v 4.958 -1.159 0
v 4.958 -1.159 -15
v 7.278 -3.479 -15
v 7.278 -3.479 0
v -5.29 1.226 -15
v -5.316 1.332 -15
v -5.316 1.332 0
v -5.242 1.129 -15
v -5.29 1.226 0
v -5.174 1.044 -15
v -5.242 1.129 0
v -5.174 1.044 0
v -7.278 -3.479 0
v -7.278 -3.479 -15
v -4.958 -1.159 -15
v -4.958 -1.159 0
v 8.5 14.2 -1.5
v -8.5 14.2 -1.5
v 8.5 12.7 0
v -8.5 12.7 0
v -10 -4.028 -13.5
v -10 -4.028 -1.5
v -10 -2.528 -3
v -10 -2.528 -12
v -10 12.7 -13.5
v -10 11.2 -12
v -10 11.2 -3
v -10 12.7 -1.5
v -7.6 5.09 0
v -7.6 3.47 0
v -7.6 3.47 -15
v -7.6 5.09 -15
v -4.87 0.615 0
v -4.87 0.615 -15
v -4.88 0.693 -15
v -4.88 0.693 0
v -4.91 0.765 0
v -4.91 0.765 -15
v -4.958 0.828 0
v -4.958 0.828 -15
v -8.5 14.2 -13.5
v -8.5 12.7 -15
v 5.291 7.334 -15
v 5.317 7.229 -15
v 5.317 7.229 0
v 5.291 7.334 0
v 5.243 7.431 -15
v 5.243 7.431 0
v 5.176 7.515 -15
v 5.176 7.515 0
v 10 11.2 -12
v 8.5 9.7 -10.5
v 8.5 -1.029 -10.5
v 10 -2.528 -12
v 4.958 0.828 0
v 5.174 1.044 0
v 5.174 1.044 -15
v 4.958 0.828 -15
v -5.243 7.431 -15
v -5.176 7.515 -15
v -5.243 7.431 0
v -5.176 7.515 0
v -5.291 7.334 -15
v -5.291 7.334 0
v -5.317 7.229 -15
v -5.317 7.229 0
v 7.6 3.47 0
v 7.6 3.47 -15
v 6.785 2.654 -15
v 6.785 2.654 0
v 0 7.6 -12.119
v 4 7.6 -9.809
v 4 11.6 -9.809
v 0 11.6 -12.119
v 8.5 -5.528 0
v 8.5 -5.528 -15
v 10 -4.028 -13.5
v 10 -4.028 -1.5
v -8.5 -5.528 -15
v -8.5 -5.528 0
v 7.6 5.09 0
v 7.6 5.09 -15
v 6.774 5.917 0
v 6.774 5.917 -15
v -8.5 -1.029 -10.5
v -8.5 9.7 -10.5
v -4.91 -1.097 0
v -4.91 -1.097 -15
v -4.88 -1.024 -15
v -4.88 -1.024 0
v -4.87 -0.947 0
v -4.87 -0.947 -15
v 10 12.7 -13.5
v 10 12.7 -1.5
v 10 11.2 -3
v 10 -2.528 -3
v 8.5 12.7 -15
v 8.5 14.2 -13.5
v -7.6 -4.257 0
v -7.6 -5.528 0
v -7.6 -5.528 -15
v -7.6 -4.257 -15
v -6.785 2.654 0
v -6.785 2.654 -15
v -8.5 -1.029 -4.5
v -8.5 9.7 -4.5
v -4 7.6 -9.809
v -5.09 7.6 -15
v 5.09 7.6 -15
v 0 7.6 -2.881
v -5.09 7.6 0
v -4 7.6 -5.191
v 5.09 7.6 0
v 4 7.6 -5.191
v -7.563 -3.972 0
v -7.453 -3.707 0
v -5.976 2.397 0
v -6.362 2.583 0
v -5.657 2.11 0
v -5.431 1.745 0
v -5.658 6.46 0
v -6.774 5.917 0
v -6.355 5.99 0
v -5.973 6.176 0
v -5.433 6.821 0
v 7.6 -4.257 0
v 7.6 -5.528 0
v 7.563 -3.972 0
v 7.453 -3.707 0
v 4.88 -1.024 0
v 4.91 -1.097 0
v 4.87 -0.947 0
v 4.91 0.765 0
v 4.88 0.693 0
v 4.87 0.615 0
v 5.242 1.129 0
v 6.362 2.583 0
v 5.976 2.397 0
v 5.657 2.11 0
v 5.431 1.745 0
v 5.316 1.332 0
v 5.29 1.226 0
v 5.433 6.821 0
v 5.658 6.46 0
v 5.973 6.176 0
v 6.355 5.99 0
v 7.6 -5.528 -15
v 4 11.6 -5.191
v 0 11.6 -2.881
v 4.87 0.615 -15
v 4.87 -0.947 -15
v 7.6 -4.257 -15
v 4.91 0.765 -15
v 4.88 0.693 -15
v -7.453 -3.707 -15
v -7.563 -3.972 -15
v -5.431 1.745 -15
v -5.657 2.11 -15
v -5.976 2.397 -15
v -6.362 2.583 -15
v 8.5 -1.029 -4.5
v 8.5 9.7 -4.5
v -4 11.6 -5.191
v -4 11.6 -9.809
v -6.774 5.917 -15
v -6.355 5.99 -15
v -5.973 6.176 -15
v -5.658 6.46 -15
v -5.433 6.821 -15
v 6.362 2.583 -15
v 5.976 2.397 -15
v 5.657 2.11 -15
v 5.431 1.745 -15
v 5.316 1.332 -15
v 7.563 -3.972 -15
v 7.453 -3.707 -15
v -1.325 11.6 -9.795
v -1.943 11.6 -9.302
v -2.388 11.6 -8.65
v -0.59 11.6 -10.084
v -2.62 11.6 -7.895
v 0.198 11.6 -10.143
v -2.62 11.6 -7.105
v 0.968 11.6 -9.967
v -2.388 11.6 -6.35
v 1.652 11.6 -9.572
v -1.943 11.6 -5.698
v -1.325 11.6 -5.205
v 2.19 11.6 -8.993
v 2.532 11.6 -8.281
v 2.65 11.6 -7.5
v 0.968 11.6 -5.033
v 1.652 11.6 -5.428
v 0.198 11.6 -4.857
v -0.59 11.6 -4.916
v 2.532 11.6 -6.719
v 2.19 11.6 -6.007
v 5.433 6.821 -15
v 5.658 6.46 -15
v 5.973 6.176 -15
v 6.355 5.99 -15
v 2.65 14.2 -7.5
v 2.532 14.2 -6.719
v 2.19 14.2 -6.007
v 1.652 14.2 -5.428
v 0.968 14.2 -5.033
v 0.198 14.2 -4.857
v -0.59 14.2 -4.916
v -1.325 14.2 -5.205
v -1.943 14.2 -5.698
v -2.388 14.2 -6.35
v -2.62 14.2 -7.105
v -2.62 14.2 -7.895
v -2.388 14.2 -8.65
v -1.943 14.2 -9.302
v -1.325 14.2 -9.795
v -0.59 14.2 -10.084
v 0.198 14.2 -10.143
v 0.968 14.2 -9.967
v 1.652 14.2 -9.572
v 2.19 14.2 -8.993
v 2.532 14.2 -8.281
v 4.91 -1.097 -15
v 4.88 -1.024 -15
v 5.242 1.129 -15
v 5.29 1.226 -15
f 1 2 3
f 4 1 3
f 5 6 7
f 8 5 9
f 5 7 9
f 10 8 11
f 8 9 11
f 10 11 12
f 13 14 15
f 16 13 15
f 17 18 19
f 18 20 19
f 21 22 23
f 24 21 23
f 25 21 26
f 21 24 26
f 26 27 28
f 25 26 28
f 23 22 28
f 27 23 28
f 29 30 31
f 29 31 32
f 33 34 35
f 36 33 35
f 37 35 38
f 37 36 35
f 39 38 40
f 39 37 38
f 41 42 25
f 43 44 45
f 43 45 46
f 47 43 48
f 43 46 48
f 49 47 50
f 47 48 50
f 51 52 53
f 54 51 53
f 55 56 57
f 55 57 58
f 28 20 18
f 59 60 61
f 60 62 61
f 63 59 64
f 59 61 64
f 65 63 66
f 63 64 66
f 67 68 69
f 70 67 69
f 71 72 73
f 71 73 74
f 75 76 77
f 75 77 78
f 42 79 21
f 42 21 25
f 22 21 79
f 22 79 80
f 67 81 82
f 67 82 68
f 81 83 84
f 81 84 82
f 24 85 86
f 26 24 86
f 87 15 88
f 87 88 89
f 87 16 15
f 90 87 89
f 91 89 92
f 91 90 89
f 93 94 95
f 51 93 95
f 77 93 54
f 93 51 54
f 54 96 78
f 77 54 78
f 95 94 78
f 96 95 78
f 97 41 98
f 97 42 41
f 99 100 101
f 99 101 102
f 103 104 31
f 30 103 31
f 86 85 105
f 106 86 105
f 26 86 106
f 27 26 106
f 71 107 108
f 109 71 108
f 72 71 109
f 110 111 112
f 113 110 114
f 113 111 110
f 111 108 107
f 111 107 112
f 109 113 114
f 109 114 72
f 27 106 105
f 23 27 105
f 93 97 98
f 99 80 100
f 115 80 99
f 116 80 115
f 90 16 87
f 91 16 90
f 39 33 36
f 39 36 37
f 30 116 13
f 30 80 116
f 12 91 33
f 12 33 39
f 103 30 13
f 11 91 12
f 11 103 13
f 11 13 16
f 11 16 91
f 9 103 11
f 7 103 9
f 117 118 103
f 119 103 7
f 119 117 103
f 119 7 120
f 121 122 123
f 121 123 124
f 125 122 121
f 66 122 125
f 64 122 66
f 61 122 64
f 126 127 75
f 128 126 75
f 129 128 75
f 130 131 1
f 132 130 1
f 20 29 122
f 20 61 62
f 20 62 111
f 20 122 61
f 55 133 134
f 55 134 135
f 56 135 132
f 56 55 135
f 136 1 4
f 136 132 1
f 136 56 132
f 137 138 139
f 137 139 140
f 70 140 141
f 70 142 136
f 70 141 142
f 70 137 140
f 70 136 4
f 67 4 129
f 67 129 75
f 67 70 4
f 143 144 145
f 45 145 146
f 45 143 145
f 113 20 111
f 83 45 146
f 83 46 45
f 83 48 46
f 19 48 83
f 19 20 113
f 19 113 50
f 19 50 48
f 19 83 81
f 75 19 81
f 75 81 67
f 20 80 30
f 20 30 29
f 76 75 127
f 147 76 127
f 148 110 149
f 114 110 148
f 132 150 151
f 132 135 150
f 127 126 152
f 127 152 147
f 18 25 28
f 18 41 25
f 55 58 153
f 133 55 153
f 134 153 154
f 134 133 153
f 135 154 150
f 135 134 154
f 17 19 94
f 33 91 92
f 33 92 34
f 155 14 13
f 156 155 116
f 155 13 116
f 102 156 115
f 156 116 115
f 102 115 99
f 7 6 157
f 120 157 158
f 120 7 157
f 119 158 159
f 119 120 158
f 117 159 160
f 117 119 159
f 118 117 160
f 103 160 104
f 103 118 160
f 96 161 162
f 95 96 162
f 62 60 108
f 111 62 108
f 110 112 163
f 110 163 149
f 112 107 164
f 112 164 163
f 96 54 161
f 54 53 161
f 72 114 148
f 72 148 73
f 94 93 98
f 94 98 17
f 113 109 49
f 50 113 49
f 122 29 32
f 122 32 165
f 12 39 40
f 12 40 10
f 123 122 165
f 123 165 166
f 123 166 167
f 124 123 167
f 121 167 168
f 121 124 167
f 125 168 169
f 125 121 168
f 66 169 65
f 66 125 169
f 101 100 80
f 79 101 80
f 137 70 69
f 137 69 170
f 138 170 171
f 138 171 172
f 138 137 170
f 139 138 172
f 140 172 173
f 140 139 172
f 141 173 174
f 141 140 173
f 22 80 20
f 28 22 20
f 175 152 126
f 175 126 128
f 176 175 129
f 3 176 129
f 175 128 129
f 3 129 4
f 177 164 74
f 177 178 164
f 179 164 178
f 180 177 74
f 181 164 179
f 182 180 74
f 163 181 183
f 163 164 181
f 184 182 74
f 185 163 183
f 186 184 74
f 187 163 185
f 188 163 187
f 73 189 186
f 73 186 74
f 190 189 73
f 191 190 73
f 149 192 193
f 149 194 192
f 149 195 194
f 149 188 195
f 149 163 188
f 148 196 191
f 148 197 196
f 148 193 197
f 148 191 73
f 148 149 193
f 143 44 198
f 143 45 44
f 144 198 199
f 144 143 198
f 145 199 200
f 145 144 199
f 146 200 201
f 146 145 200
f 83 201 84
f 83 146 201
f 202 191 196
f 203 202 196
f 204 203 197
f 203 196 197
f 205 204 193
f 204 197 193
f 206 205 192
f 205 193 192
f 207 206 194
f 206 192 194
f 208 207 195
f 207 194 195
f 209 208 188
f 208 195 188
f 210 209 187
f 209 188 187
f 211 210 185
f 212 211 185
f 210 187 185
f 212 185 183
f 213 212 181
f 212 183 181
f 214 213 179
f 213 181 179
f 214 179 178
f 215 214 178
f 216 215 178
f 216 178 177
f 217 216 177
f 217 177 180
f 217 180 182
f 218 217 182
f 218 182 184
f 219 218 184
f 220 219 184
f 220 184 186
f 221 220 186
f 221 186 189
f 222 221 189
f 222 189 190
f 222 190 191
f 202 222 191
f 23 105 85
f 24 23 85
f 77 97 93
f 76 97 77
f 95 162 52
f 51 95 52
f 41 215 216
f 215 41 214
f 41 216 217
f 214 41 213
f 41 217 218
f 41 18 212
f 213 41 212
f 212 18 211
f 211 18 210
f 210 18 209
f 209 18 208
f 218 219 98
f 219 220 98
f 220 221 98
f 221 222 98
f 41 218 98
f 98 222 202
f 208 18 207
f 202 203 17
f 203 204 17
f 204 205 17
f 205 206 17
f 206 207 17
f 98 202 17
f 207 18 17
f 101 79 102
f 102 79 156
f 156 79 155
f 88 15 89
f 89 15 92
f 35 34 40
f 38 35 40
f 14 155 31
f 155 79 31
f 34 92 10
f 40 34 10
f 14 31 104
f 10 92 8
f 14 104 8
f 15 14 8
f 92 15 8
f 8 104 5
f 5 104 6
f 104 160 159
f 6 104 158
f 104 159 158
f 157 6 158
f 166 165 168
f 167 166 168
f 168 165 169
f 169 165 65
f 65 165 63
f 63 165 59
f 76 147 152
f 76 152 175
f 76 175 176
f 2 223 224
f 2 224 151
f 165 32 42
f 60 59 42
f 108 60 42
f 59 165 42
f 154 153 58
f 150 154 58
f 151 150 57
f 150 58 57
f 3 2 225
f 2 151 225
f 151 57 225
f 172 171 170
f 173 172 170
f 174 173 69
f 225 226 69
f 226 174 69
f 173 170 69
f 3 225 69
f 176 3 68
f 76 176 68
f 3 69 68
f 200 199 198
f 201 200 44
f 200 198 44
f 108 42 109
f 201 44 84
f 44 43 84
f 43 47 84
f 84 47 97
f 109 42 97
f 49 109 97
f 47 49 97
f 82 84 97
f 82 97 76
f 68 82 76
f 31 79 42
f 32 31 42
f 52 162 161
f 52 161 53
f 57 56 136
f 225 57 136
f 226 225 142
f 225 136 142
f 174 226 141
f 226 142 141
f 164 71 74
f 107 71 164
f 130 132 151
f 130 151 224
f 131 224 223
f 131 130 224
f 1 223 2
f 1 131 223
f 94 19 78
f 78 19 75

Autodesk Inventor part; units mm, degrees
ref_plane "YZ Plane" through (0, 0, 0) normal (1, 0, 0) x (0, 1, 0)
ref_plane "XZ Plane" through (0, 0, 0) normal (0, 1, 0) x (-1, 0, 0)
ref_plane "XY Plane" through (0, 0, 0) normal (0, 0, 1) x (1, 0, 0)
sketch "Sketch1" plane through (0, 0, 0) normal (0, 0, 1) x (1, 0, 0)
  arc A0 (-5.217, 1.3451) -> (-5.1032, 1.1142) centre (-4.8204, 1.397) ccw projected
  line L0 (-5.1032, 1.1142) -> (-4.8872, 0.8982) projected
  arc A1 (-4.77, 0.6153) -> (-4.8872, 0.8982) centre (-5.17, 0.6153) ccw projected
  line L1 (-4.77, 0.6153) -> (-4.77, -0.9467) projected
  arc A2 (-4.8872, -1.2296) -> (-4.77, -0.9467) centre (-5.17, -0.9467) ccw projected
  line L2 (-4.8872, -1.2296) -> (-7.2071, -3.5495) projected
  arc A3 (-7.2071, -3.5495) -> (-7.5, -4.2566) centre (-6.5, -4.2566) ccw projected
  line L3 (-7.5, -4.2566) -> (-7.5, -6.8) projected
  line L4 (-7.5, -6.8) -> (-6.8, -7.5) projected
  line L5 (-6.8, -7.5) -> (6.8, -7.5) projected
  line L6 (6.8, -7.5) -> (7.5, -6.8) projected
  line L7 (7.5, -6.8) -> (7.5, -4.2566) projected
  arc A4 (7.5, -4.2566) -> (7.2071, -3.5495) centre (6.5, -4.2566) ccw projected
  line L8 (7.2071, -3.5495) -> (4.8872, -1.2296) projected
  arc A5 (4.77, -0.9467) -> (4.8872, -1.2296) centre (5.17, -0.9467) ccw projected
  line L9 (4.77, -0.9467) -> (4.77, 0.6153) projected
  arc A6 (4.8872, 0.8982) -> (4.77, 0.6153) centre (5.17, 0.6153) ccw projected
  line L10 (4.8872, 0.8982) -> (5.1032, 1.1142) projected
  arc A7 (5.1032, 1.1142) -> (5.217, 1.3451) centre (4.8204, 1.397) ccw projected
  arc A8 (6.7419, 2.7529) -> (5.217, 1.3451) centre (6.8233, 1.1349) ccw projected
  line L11 (6.7419, 2.7529) -> (7.5, 3.511) projected
  line L12 (7.5, 3.511) -> (7.5, 5.049) projected
  line L13 (7.5, 5.049) -> (6.7304, 5.8186) projected
  arc A9 (5.2183, 7.2157) -> (6.7304, 5.8186) centre (6.8233, 7.436) ccw projected
  arc A10 (5.2183, 7.2157) -> (5.1049, 7.4441) centre (4.822, 7.1613) ccw projected
  line L14 (5.1049, 7.4441) -> (5.049, 7.5) projected
  line L15 (5.049, 7.5) -> (-5.049, 7.5) projected
  line L16 (-5.049, 7.5) -> (-5.1049, 7.4441) projected
  arc A11 (-5.1049, 7.4441) -> (-5.2183, 7.2157) centre (-4.822, 7.1613) ccw projected
  arc A12 (-6.7304, 5.8186) -> (-5.2183, 7.2157) centre (-6.8233, 7.436) ccw projected
  line L17 (-6.7304, 5.8186) -> (-7.5, 5.049) projected
  line L18 (-7.5, 5.049) -> (-7.5, 3.511) projected
  line L19 (-7.5, 3.511) -> (-6.7419, 2.7529) projected
  arc A13 (-5.217, 1.3451) -> (-6.7419, 2.7529) centre (-6.8233, 1.1349) ccw projected
  line L20 (-7.5, -5.5283) -> (-10, -5.5283)
  line L21 (-10, -5.5283) -> (-10, 14.2)
  line L22 (-10, 14.2) -> (10, 14.2)
  line L23 (10, 14.2) -> (10, -5.5283)
  line L24 (10, -5.5283) -> (7.5, -5.5283)
  arc A14 (-7.2778, -3.4788) -> (-7.6, -4.2566) centre (-6.5, -4.2566) ccw
  line L25 (-7.2778, -3.4788) -> (-4.9579, -1.1589)
  arc A15 (-4.9579, -1.1589) -> (-4.87, -0.9467) centre (-5.17, -0.9467) ccw
  line L26 (-4.87, -0.9467) -> (-4.87, 0.6153)
  arc A16 (-4.87, 0.6153) -> (-4.9579, 0.8275) centre (-5.17, 0.6153) ccw
  line L27 (-4.9579, 0.8275) -> (-5.1739, 1.0435)
  arc A17 (-5.3161, 1.3322) -> (-5.1739, 1.0435) centre (-4.8204, 1.397) ccw
  arc A18 (-5.3161, 1.3322) -> (-6.7848, 2.6544) centre (-6.8233, 1.1349) ccw
  line L28 (-6.7848, 2.6544) -> (-7.6, 3.4696)
  line L29 (-7.6, 3.4696) -> (-7.6, 5.0904)
  line L30 (-7.6, 5.0904) -> (-6.7736, 5.9168)
  arc A19 (-6.7736, 5.9168) -> (-5.3174, 7.2293) centre (-6.8233, 7.436) ccw
  arc A20 (-5.1756, 7.5148) -> (-5.3174, 7.2293) centre (-4.822, 7.1613) ccw
  line L31 (-5.1756, 7.5148) -> (-5.0904, 7.6)
  line L32 (-5.0904, 7.6) -> (5.0904, 7.6)
  line L33 (5.0904, 7.6) -> (5.1756, 7.5148)
  arc A21 (5.3174, 7.2293) -> (5.1756, 7.5148) centre (4.822, 7.1613) ccw
  arc A22 (5.3174, 7.2293) -> (6.7736, 5.9168) centre (6.8233, 7.436) ccw
  line L34 (6.7736, 5.9168) -> (7.6, 5.0904)
  line L35 (7.6, 5.0904) -> (7.6, 3.4696)
  line L36 (7.6, 3.4696) -> (6.7848, 2.6544)
  arc A23 (6.7848, 2.6544) -> (5.3161, 1.3322) centre (6.8233, 1.1349) ccw
  arc A24 (5.1739, 1.0435) -> (5.3161, 1.3322) centre (4.8204, 1.397) ccw
  line L37 (5.1739, 1.0435) -> (4.9579, 0.8275)
  arc A25 (4.9579, 0.8275) -> (4.87, 0.6153) centre (5.17, 0.6153) ccw
  line L38 (4.87, 0.6153) -> (4.87, -0.9467)
  arc A26 (4.87, -0.9467) -> (4.9579, -1.1589) centre (5.17, -0.9467) ccw
  line L39 (4.9579, -1.1589) -> (7.2778, -3.4788)
  arc A27 (7.6, -4.2566) -> (7.2778, -3.4788) centre (6.5, -4.2566) ccw
  line L40 (7.6, -4.2566) -> (7.6, -6.8414)
  line L41 (7.6, -6.8414) -> (6.8414, -7.6)
  line L42 (6.8414, -7.6) -> (-6.8414, -7.6)
  line L43 (-6.8414, -7.6) -> (-7.6, -6.8414)
  line L44 (-7.6, -6.8414) -> (-7.6, -4.2566)
  point P0 (0, 0)
  point P1 (-7.6, -5.5283)
  point P2 (7.6, -5.5283)
  dimension "d2" = 6.7
  dimension "d20" = 2.5
  dimension "d21" = 0.1
extrude "Extrusion1" add sketch "Sketch1" against normal blind 15 contours L20 L21 L22 L23 L24 L40 A27 L39 A26 L38 A25 L37 A24 A23 L36 L35 L34 A22 A21 L33 L32 L31 A20 A19 L30 L29 L28 A18 A17 L27 A16 L26 A15 L25 A14 L44
chamfer "Chamfer1" distance 1.5 angle 45 10 edges at (-10, -5.5283, -7.5) (-10, 4.3358, -15) (-10, 4.3358, 0) (0, 14.2, -15) (0, 14.2, 0) (-10, 14.2, -7.5) (10, 4.3358, -15) (10, 4.3358, 0) (10, -5.5283, -7.5) (10, 14.2, -7.5)
sketch "Sketch3" plane through (-5.049, 7.6, 0) normal (0, -1, 0) x (1, 0, 0)
  line L0 (5.049, 0) -> (5.049, -15) construction
  circle A0 centre (5.049, -7.5) radius 2.65
  line L1 (10.1394, -15) -> (-0.0414, -15) projected
  dimension "d8" = 5.3
extrude "Extrusion2" cut sketch "Sketch3" against normal blind 15
sketch "Sketch4" plane through (-5.049, 7.6, 0) normal (0, -1, 0) x (1, 0, 0)
  line L0 (1.049, -5.1906) -> (5.049, -2.8812)
  line L1 (5.049, -2.8812) -> (9.049, -5.1906)
  line L2 (9.049, -5.1906) -> (9.049, -9.8094)
  line L3 (9.049, -9.8094) -> (5.049, -12.1188)
  line L4 (5.049, -12.1188) -> (1.049, -9.8094)
  line L5 (1.049, -9.8094) -> (1.049, -5.1906)
  point P0 (5.049, 0)
  point P1 (5.049, -7.5)
  point P2 (5.049, -7.5)
  dimension "d11" = 8
extrude "Extrusion3" cut sketch "Sketch4" against normal blind 4
sketch "Sketch5" plane through (10, -4.0283, -13.5) normal (1, 0, 0) x (0, 0, -1)
  line L0 (0, 0) -> (-12, 0) projected
  line L1 (0, 16.7283) -> (0, 0) projected
  line L2 (-12, 16.7283) -> (0, 16.7283) projected
  line L3 (-12, 0) -> (-12, 16.7283) projected
  line L4 (-10.5, 15.2283) -> (-1.5, 15.2283)
  line L5 (-1.5, 15.2283) -> (-1.5, 1.5)
  line L6 (-1.5, 1.5) -> (-10.5, 1.5)
  line L7 (-10.5, 1.5) -> (-10.5, 15.2283)
  point P0 (-13.5, 4.0283)
  dimension "d14" = 1.5
extrude "Extrusion4" cut sketch "Sketch5" against normal blind 1.5 contours L4 L5 L6 L7
chamfer "Chamfer2" distance 1.5 angle 45 4 edges at (8.5, 4.3358, -3) (8.5, -2.5283, -7.5) (8.5, 11.2, -7.5) (8.5, 4.3358, -12)
mirror "Mirror1" about plane through (0, 0, 0) normal (1, 0, 0) of "Extrusion4", "Chamfer2"
properties part number "Tope Final" material "PET Plastic"
